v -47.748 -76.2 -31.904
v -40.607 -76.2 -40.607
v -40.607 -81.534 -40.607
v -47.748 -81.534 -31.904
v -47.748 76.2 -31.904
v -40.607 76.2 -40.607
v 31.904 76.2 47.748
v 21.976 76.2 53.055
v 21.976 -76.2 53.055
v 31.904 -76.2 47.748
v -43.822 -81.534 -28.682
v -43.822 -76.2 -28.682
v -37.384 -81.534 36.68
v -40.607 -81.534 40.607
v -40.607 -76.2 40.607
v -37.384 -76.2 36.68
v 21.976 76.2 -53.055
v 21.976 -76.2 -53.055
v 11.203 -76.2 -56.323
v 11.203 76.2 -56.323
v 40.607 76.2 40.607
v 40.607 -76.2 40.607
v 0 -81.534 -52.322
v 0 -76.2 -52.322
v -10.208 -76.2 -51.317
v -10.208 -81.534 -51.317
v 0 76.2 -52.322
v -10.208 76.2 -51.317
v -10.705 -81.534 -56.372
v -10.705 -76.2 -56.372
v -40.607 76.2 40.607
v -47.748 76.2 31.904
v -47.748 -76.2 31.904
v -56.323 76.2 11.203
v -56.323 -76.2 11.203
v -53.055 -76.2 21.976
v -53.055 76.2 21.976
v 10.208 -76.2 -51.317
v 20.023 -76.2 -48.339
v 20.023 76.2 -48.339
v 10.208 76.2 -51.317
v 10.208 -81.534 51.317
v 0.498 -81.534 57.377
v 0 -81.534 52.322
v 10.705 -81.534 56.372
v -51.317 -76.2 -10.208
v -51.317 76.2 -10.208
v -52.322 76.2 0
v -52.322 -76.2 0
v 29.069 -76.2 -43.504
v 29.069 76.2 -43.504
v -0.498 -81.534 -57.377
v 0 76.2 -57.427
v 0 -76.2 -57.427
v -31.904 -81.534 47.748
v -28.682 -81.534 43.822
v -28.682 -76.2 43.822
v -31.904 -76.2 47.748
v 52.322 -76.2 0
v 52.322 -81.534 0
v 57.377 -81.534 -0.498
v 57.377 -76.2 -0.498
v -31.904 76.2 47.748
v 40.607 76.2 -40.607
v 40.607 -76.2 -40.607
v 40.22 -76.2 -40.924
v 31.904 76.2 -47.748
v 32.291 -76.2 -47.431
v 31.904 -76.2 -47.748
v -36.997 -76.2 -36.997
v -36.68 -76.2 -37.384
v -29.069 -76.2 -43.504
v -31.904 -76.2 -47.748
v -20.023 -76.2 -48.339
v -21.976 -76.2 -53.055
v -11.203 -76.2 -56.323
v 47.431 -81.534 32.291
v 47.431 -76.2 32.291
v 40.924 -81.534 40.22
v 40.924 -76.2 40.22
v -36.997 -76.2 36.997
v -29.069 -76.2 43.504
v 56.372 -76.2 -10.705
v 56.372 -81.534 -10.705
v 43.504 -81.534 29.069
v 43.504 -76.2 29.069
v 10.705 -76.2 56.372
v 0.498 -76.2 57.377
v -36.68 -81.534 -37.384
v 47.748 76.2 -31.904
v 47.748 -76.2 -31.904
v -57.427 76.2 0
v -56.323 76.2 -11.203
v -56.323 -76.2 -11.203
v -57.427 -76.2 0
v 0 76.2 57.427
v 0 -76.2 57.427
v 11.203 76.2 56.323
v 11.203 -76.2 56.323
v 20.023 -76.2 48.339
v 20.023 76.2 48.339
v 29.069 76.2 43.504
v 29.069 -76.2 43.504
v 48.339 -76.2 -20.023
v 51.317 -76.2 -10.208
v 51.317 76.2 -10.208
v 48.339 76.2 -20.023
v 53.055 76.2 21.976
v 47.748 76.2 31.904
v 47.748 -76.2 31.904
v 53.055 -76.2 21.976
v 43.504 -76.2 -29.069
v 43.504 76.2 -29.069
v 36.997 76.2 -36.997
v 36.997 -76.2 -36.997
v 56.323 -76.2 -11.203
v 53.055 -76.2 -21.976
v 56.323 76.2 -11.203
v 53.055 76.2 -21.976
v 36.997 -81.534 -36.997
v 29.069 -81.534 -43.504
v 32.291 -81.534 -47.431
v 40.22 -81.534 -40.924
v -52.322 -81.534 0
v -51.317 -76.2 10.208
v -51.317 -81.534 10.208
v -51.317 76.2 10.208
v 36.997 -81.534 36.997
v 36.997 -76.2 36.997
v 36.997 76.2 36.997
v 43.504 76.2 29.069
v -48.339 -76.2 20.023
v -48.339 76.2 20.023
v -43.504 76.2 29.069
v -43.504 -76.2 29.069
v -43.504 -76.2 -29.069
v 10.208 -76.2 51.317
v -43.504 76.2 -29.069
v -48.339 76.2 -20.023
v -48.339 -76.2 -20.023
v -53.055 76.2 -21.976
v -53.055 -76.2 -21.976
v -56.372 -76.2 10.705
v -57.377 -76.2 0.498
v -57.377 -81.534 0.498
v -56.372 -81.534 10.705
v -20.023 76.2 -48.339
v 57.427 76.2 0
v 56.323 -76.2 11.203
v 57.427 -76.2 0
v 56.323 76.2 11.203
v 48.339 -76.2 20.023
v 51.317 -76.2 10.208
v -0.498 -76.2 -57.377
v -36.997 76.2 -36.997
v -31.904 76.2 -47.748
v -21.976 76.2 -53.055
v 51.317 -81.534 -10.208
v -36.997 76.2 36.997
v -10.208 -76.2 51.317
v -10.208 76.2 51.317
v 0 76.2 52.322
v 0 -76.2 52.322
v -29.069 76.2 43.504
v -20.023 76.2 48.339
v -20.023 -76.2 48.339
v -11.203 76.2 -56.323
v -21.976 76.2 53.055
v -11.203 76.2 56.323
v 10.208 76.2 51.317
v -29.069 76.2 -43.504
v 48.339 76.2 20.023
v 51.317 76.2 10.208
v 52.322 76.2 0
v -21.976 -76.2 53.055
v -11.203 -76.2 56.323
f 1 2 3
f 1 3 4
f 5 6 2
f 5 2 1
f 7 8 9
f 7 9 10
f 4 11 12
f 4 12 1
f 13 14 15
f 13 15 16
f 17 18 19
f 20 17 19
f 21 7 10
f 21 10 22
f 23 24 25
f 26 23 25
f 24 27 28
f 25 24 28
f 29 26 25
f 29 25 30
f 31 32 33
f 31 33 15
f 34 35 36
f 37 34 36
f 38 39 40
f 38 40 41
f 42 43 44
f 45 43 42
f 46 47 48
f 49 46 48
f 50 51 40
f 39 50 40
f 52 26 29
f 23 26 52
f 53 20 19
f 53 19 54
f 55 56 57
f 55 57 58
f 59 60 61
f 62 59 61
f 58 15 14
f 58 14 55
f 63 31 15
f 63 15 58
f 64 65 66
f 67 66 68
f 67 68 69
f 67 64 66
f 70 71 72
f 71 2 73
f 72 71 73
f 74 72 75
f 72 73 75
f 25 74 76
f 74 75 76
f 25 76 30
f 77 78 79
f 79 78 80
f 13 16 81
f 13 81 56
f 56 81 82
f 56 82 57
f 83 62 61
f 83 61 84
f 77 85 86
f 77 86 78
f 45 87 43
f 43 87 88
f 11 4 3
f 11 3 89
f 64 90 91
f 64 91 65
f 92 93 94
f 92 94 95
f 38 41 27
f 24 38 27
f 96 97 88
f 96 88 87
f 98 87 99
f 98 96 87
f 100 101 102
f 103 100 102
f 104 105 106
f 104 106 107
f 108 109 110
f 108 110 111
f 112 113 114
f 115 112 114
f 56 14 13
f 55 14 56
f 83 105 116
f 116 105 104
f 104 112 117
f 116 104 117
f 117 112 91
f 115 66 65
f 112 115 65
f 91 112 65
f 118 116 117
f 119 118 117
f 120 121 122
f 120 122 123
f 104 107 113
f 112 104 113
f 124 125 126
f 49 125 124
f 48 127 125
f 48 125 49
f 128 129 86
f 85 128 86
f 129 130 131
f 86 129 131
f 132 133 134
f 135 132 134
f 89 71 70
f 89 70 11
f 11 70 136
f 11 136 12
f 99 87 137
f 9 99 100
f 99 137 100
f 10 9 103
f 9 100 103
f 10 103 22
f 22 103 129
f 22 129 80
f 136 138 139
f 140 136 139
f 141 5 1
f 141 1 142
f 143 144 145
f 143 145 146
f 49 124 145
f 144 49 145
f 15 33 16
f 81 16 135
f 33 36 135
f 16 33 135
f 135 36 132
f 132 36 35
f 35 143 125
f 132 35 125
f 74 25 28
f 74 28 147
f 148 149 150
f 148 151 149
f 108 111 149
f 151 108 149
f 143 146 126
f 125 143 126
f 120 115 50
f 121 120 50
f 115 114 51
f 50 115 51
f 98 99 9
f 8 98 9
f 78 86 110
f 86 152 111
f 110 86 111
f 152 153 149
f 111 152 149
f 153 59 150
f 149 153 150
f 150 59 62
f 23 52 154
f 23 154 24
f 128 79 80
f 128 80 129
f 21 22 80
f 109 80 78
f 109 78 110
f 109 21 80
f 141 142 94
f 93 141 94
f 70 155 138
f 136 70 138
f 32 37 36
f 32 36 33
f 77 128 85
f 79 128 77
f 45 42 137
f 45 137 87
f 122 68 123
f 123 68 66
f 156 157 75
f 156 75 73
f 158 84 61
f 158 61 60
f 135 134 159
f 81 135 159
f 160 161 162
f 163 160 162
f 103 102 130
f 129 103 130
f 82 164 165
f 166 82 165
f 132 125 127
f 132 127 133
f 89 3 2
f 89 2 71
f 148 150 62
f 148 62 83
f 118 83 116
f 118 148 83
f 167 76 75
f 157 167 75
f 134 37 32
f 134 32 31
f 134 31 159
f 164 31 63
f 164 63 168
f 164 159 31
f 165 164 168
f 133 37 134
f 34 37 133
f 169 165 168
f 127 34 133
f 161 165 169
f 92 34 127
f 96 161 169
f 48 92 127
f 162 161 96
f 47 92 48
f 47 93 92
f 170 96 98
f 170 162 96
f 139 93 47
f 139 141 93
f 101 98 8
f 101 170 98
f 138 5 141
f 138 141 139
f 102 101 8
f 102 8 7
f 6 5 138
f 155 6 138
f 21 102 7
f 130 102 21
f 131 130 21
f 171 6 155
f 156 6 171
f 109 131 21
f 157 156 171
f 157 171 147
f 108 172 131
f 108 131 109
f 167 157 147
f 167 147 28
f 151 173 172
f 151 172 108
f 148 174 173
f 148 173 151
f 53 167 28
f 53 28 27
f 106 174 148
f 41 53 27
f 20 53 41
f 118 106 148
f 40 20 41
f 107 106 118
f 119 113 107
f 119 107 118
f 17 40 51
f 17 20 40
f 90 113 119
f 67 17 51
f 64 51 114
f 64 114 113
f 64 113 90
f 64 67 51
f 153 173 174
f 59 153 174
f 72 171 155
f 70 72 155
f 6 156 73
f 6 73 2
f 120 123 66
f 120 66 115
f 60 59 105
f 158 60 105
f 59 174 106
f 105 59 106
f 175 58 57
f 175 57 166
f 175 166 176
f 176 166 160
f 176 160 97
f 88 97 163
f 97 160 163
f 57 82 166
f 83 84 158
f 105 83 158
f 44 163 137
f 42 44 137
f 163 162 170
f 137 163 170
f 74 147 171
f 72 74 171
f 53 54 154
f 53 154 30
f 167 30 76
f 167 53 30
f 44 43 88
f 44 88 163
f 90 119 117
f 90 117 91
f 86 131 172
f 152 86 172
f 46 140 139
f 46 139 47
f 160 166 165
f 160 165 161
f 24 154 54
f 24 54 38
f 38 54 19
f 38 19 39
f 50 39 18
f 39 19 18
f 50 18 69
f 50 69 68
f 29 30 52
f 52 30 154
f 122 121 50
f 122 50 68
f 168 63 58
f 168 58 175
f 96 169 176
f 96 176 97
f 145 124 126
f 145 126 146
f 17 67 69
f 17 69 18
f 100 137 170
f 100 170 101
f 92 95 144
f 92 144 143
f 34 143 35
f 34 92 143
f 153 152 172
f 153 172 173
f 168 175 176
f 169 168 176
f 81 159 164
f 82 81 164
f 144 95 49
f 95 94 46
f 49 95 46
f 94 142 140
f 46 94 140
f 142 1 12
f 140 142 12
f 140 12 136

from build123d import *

# Parameters (mm, degrees)
BOSS_EXTRUDE1_DEPTH = 76.2
CUT_EXTRUDE1_DEPTH  = 173.688654555
BOSS_EXTRUDE2_DEPTH = 5.334


with BuildPart() as part:
    # Sketch4 → Boss-Extrude1 (new, symmetric)
    with BuildSketch(Plane(origin=(0, 0, 0), x_dir=(1, 0, 0), z_dir=(0, 1, 0))):
        Polygon((57.426524411, 0), (56.323089847, 11.20335914), (53.055190527, 21.976179471), (47.748409988, 31.904467549), (40.606684831, 40.606684831), (31.904467549, 47.748409988), (21.976179471, 53.055190527), (11.20335914, 56.323089847), (0, 57.426524411), (-11.20335914, 56.323089847), (-21.976179471, 53.055190527), (-31.904467549, 47.748409988), (-40.606684831, 40.606684831), (-47.748409988, 31.904467549), (-53.055190527, 21.976179471), (-56.323089847, 11.20335914), (-57.426524411, 0), (-56.323089847, -11.20335914), (-53.055190527, -21.976179471), (-47.748409988, -31.904467549), (-40.606684831, -40.606684831), (-31.904467549, -47.748409988), (-21.976179471, -53.055190527), (-11.20335914, -56.323089847), (0, -57.426524411), (11.20335914, -56.323089847), (21.976179471, -53.055190527), (31.904467549, -47.748409988), (40.606684831, -40.606684831), (47.748409988, -31.904467549), (53.055190527, -21.976179471), (56.323089847, -11.20335914), align=None)
    extrude(amount=BOSS_EXTRUDE1_DEPTH, both=True)

    # Sketch5 → Cut-Extrude1 (cut, through all)
    with BuildSketch(Plane(origin=(0, 76.2, 0), x_dir=(1, 0, 0), z_dir=(0, 1, 0))):
        Polygon((51.316592972, -10.207504994), (52.321944464, 0), (51.316592972, 10.207504994), (48.339173591, 20.022741295), (43.504106878, 29.068514878), (36.997201735, 36.997201735), (29.068514878, 43.504106878), (20.022741295, 48.339173591), (10.207504994, 51.316592972), (0, 52.321944464), (-10.207504994, 51.316592972), (-20.022741295, 48.339173591), (-29.068514878, 43.504106878), (-36.997201735, 36.997201735), (-43.504106878, 29.068514878), (-48.339173591, 20.022741295), (-51.316592972, 10.207504994), (-52.321944464, 0), (-51.316592972, -10.207504994), (-48.339173591, -20.022741295), (-43.504106878, -29.068514878), (-36.997201735, -36.997201735), (-29.068514878, -43.504106878), (-20.022741295, -48.339173591), (-10.207504994, -51.316592972), (0, -52.321944464), (10.207504994, -51.316592972), (20.022741295, -48.339173591), (29.068514878, -43.504106878), (36.997201735, -36.997201735), (43.504106878, -29.068514878), (48.339173591, -20.022741295), align=None)
    extrude(amount=-CUT_EXTRUDE1_DEPTH, mode=Mode.SUBTRACT)

    # Sketch6 → Boss-Extrude2 (add)
    with BuildSketch(Plane.XZ.offset(76.2)):
        Polygon((-51.316592972, 10.207504994), (-52.321944464, 0), (-57.377482875, 0.497927073), (-56.372131384, 10.705432067), align=None)
        Polygon((57.377482875, -0.497927073), (56.372131384, -10.705432067), (51.316592972, -10.207504994), (52.321944464, 0), align=None)
        Polygon((-47.748409988, -31.904467549), (-40.606684831, -40.606684831), (-36.679791728, -37.383966948), (-43.821516885, -28.681749665), align=None)
        Polygon((36.997201735, -36.997201735), (29.068514878, -43.504106878), (32.291232761, -47.430999981), (40.219919619, -40.924094838), align=None)
        Polygon((47.430999981, 32.291232761), (40.924094838, 40.219919619), (36.997201735, 36.997201735), (43.504106878, 29.068514878), align=None)
        Polygon((-37.383966948, 36.679791728), (-28.681749665, 43.821516885), (-31.904467549, 47.748409988), (-40.606684831, 40.606684831), align=None)
        Polygon((0, 52.321944464), (10.207504994, 51.316592972), (10.705432067, 56.372131384), (0.497927073, 57.377482875), align=None)
        Polygon((-10.705432067, -56.372131384), (-0.497927073, -57.377482875), (0, -52.321944464), (-10.207504994, -51.316592972), align=None)
    extrude(amount=BOSS_EXTRUDE2_DEPTH)


solid = part.part
